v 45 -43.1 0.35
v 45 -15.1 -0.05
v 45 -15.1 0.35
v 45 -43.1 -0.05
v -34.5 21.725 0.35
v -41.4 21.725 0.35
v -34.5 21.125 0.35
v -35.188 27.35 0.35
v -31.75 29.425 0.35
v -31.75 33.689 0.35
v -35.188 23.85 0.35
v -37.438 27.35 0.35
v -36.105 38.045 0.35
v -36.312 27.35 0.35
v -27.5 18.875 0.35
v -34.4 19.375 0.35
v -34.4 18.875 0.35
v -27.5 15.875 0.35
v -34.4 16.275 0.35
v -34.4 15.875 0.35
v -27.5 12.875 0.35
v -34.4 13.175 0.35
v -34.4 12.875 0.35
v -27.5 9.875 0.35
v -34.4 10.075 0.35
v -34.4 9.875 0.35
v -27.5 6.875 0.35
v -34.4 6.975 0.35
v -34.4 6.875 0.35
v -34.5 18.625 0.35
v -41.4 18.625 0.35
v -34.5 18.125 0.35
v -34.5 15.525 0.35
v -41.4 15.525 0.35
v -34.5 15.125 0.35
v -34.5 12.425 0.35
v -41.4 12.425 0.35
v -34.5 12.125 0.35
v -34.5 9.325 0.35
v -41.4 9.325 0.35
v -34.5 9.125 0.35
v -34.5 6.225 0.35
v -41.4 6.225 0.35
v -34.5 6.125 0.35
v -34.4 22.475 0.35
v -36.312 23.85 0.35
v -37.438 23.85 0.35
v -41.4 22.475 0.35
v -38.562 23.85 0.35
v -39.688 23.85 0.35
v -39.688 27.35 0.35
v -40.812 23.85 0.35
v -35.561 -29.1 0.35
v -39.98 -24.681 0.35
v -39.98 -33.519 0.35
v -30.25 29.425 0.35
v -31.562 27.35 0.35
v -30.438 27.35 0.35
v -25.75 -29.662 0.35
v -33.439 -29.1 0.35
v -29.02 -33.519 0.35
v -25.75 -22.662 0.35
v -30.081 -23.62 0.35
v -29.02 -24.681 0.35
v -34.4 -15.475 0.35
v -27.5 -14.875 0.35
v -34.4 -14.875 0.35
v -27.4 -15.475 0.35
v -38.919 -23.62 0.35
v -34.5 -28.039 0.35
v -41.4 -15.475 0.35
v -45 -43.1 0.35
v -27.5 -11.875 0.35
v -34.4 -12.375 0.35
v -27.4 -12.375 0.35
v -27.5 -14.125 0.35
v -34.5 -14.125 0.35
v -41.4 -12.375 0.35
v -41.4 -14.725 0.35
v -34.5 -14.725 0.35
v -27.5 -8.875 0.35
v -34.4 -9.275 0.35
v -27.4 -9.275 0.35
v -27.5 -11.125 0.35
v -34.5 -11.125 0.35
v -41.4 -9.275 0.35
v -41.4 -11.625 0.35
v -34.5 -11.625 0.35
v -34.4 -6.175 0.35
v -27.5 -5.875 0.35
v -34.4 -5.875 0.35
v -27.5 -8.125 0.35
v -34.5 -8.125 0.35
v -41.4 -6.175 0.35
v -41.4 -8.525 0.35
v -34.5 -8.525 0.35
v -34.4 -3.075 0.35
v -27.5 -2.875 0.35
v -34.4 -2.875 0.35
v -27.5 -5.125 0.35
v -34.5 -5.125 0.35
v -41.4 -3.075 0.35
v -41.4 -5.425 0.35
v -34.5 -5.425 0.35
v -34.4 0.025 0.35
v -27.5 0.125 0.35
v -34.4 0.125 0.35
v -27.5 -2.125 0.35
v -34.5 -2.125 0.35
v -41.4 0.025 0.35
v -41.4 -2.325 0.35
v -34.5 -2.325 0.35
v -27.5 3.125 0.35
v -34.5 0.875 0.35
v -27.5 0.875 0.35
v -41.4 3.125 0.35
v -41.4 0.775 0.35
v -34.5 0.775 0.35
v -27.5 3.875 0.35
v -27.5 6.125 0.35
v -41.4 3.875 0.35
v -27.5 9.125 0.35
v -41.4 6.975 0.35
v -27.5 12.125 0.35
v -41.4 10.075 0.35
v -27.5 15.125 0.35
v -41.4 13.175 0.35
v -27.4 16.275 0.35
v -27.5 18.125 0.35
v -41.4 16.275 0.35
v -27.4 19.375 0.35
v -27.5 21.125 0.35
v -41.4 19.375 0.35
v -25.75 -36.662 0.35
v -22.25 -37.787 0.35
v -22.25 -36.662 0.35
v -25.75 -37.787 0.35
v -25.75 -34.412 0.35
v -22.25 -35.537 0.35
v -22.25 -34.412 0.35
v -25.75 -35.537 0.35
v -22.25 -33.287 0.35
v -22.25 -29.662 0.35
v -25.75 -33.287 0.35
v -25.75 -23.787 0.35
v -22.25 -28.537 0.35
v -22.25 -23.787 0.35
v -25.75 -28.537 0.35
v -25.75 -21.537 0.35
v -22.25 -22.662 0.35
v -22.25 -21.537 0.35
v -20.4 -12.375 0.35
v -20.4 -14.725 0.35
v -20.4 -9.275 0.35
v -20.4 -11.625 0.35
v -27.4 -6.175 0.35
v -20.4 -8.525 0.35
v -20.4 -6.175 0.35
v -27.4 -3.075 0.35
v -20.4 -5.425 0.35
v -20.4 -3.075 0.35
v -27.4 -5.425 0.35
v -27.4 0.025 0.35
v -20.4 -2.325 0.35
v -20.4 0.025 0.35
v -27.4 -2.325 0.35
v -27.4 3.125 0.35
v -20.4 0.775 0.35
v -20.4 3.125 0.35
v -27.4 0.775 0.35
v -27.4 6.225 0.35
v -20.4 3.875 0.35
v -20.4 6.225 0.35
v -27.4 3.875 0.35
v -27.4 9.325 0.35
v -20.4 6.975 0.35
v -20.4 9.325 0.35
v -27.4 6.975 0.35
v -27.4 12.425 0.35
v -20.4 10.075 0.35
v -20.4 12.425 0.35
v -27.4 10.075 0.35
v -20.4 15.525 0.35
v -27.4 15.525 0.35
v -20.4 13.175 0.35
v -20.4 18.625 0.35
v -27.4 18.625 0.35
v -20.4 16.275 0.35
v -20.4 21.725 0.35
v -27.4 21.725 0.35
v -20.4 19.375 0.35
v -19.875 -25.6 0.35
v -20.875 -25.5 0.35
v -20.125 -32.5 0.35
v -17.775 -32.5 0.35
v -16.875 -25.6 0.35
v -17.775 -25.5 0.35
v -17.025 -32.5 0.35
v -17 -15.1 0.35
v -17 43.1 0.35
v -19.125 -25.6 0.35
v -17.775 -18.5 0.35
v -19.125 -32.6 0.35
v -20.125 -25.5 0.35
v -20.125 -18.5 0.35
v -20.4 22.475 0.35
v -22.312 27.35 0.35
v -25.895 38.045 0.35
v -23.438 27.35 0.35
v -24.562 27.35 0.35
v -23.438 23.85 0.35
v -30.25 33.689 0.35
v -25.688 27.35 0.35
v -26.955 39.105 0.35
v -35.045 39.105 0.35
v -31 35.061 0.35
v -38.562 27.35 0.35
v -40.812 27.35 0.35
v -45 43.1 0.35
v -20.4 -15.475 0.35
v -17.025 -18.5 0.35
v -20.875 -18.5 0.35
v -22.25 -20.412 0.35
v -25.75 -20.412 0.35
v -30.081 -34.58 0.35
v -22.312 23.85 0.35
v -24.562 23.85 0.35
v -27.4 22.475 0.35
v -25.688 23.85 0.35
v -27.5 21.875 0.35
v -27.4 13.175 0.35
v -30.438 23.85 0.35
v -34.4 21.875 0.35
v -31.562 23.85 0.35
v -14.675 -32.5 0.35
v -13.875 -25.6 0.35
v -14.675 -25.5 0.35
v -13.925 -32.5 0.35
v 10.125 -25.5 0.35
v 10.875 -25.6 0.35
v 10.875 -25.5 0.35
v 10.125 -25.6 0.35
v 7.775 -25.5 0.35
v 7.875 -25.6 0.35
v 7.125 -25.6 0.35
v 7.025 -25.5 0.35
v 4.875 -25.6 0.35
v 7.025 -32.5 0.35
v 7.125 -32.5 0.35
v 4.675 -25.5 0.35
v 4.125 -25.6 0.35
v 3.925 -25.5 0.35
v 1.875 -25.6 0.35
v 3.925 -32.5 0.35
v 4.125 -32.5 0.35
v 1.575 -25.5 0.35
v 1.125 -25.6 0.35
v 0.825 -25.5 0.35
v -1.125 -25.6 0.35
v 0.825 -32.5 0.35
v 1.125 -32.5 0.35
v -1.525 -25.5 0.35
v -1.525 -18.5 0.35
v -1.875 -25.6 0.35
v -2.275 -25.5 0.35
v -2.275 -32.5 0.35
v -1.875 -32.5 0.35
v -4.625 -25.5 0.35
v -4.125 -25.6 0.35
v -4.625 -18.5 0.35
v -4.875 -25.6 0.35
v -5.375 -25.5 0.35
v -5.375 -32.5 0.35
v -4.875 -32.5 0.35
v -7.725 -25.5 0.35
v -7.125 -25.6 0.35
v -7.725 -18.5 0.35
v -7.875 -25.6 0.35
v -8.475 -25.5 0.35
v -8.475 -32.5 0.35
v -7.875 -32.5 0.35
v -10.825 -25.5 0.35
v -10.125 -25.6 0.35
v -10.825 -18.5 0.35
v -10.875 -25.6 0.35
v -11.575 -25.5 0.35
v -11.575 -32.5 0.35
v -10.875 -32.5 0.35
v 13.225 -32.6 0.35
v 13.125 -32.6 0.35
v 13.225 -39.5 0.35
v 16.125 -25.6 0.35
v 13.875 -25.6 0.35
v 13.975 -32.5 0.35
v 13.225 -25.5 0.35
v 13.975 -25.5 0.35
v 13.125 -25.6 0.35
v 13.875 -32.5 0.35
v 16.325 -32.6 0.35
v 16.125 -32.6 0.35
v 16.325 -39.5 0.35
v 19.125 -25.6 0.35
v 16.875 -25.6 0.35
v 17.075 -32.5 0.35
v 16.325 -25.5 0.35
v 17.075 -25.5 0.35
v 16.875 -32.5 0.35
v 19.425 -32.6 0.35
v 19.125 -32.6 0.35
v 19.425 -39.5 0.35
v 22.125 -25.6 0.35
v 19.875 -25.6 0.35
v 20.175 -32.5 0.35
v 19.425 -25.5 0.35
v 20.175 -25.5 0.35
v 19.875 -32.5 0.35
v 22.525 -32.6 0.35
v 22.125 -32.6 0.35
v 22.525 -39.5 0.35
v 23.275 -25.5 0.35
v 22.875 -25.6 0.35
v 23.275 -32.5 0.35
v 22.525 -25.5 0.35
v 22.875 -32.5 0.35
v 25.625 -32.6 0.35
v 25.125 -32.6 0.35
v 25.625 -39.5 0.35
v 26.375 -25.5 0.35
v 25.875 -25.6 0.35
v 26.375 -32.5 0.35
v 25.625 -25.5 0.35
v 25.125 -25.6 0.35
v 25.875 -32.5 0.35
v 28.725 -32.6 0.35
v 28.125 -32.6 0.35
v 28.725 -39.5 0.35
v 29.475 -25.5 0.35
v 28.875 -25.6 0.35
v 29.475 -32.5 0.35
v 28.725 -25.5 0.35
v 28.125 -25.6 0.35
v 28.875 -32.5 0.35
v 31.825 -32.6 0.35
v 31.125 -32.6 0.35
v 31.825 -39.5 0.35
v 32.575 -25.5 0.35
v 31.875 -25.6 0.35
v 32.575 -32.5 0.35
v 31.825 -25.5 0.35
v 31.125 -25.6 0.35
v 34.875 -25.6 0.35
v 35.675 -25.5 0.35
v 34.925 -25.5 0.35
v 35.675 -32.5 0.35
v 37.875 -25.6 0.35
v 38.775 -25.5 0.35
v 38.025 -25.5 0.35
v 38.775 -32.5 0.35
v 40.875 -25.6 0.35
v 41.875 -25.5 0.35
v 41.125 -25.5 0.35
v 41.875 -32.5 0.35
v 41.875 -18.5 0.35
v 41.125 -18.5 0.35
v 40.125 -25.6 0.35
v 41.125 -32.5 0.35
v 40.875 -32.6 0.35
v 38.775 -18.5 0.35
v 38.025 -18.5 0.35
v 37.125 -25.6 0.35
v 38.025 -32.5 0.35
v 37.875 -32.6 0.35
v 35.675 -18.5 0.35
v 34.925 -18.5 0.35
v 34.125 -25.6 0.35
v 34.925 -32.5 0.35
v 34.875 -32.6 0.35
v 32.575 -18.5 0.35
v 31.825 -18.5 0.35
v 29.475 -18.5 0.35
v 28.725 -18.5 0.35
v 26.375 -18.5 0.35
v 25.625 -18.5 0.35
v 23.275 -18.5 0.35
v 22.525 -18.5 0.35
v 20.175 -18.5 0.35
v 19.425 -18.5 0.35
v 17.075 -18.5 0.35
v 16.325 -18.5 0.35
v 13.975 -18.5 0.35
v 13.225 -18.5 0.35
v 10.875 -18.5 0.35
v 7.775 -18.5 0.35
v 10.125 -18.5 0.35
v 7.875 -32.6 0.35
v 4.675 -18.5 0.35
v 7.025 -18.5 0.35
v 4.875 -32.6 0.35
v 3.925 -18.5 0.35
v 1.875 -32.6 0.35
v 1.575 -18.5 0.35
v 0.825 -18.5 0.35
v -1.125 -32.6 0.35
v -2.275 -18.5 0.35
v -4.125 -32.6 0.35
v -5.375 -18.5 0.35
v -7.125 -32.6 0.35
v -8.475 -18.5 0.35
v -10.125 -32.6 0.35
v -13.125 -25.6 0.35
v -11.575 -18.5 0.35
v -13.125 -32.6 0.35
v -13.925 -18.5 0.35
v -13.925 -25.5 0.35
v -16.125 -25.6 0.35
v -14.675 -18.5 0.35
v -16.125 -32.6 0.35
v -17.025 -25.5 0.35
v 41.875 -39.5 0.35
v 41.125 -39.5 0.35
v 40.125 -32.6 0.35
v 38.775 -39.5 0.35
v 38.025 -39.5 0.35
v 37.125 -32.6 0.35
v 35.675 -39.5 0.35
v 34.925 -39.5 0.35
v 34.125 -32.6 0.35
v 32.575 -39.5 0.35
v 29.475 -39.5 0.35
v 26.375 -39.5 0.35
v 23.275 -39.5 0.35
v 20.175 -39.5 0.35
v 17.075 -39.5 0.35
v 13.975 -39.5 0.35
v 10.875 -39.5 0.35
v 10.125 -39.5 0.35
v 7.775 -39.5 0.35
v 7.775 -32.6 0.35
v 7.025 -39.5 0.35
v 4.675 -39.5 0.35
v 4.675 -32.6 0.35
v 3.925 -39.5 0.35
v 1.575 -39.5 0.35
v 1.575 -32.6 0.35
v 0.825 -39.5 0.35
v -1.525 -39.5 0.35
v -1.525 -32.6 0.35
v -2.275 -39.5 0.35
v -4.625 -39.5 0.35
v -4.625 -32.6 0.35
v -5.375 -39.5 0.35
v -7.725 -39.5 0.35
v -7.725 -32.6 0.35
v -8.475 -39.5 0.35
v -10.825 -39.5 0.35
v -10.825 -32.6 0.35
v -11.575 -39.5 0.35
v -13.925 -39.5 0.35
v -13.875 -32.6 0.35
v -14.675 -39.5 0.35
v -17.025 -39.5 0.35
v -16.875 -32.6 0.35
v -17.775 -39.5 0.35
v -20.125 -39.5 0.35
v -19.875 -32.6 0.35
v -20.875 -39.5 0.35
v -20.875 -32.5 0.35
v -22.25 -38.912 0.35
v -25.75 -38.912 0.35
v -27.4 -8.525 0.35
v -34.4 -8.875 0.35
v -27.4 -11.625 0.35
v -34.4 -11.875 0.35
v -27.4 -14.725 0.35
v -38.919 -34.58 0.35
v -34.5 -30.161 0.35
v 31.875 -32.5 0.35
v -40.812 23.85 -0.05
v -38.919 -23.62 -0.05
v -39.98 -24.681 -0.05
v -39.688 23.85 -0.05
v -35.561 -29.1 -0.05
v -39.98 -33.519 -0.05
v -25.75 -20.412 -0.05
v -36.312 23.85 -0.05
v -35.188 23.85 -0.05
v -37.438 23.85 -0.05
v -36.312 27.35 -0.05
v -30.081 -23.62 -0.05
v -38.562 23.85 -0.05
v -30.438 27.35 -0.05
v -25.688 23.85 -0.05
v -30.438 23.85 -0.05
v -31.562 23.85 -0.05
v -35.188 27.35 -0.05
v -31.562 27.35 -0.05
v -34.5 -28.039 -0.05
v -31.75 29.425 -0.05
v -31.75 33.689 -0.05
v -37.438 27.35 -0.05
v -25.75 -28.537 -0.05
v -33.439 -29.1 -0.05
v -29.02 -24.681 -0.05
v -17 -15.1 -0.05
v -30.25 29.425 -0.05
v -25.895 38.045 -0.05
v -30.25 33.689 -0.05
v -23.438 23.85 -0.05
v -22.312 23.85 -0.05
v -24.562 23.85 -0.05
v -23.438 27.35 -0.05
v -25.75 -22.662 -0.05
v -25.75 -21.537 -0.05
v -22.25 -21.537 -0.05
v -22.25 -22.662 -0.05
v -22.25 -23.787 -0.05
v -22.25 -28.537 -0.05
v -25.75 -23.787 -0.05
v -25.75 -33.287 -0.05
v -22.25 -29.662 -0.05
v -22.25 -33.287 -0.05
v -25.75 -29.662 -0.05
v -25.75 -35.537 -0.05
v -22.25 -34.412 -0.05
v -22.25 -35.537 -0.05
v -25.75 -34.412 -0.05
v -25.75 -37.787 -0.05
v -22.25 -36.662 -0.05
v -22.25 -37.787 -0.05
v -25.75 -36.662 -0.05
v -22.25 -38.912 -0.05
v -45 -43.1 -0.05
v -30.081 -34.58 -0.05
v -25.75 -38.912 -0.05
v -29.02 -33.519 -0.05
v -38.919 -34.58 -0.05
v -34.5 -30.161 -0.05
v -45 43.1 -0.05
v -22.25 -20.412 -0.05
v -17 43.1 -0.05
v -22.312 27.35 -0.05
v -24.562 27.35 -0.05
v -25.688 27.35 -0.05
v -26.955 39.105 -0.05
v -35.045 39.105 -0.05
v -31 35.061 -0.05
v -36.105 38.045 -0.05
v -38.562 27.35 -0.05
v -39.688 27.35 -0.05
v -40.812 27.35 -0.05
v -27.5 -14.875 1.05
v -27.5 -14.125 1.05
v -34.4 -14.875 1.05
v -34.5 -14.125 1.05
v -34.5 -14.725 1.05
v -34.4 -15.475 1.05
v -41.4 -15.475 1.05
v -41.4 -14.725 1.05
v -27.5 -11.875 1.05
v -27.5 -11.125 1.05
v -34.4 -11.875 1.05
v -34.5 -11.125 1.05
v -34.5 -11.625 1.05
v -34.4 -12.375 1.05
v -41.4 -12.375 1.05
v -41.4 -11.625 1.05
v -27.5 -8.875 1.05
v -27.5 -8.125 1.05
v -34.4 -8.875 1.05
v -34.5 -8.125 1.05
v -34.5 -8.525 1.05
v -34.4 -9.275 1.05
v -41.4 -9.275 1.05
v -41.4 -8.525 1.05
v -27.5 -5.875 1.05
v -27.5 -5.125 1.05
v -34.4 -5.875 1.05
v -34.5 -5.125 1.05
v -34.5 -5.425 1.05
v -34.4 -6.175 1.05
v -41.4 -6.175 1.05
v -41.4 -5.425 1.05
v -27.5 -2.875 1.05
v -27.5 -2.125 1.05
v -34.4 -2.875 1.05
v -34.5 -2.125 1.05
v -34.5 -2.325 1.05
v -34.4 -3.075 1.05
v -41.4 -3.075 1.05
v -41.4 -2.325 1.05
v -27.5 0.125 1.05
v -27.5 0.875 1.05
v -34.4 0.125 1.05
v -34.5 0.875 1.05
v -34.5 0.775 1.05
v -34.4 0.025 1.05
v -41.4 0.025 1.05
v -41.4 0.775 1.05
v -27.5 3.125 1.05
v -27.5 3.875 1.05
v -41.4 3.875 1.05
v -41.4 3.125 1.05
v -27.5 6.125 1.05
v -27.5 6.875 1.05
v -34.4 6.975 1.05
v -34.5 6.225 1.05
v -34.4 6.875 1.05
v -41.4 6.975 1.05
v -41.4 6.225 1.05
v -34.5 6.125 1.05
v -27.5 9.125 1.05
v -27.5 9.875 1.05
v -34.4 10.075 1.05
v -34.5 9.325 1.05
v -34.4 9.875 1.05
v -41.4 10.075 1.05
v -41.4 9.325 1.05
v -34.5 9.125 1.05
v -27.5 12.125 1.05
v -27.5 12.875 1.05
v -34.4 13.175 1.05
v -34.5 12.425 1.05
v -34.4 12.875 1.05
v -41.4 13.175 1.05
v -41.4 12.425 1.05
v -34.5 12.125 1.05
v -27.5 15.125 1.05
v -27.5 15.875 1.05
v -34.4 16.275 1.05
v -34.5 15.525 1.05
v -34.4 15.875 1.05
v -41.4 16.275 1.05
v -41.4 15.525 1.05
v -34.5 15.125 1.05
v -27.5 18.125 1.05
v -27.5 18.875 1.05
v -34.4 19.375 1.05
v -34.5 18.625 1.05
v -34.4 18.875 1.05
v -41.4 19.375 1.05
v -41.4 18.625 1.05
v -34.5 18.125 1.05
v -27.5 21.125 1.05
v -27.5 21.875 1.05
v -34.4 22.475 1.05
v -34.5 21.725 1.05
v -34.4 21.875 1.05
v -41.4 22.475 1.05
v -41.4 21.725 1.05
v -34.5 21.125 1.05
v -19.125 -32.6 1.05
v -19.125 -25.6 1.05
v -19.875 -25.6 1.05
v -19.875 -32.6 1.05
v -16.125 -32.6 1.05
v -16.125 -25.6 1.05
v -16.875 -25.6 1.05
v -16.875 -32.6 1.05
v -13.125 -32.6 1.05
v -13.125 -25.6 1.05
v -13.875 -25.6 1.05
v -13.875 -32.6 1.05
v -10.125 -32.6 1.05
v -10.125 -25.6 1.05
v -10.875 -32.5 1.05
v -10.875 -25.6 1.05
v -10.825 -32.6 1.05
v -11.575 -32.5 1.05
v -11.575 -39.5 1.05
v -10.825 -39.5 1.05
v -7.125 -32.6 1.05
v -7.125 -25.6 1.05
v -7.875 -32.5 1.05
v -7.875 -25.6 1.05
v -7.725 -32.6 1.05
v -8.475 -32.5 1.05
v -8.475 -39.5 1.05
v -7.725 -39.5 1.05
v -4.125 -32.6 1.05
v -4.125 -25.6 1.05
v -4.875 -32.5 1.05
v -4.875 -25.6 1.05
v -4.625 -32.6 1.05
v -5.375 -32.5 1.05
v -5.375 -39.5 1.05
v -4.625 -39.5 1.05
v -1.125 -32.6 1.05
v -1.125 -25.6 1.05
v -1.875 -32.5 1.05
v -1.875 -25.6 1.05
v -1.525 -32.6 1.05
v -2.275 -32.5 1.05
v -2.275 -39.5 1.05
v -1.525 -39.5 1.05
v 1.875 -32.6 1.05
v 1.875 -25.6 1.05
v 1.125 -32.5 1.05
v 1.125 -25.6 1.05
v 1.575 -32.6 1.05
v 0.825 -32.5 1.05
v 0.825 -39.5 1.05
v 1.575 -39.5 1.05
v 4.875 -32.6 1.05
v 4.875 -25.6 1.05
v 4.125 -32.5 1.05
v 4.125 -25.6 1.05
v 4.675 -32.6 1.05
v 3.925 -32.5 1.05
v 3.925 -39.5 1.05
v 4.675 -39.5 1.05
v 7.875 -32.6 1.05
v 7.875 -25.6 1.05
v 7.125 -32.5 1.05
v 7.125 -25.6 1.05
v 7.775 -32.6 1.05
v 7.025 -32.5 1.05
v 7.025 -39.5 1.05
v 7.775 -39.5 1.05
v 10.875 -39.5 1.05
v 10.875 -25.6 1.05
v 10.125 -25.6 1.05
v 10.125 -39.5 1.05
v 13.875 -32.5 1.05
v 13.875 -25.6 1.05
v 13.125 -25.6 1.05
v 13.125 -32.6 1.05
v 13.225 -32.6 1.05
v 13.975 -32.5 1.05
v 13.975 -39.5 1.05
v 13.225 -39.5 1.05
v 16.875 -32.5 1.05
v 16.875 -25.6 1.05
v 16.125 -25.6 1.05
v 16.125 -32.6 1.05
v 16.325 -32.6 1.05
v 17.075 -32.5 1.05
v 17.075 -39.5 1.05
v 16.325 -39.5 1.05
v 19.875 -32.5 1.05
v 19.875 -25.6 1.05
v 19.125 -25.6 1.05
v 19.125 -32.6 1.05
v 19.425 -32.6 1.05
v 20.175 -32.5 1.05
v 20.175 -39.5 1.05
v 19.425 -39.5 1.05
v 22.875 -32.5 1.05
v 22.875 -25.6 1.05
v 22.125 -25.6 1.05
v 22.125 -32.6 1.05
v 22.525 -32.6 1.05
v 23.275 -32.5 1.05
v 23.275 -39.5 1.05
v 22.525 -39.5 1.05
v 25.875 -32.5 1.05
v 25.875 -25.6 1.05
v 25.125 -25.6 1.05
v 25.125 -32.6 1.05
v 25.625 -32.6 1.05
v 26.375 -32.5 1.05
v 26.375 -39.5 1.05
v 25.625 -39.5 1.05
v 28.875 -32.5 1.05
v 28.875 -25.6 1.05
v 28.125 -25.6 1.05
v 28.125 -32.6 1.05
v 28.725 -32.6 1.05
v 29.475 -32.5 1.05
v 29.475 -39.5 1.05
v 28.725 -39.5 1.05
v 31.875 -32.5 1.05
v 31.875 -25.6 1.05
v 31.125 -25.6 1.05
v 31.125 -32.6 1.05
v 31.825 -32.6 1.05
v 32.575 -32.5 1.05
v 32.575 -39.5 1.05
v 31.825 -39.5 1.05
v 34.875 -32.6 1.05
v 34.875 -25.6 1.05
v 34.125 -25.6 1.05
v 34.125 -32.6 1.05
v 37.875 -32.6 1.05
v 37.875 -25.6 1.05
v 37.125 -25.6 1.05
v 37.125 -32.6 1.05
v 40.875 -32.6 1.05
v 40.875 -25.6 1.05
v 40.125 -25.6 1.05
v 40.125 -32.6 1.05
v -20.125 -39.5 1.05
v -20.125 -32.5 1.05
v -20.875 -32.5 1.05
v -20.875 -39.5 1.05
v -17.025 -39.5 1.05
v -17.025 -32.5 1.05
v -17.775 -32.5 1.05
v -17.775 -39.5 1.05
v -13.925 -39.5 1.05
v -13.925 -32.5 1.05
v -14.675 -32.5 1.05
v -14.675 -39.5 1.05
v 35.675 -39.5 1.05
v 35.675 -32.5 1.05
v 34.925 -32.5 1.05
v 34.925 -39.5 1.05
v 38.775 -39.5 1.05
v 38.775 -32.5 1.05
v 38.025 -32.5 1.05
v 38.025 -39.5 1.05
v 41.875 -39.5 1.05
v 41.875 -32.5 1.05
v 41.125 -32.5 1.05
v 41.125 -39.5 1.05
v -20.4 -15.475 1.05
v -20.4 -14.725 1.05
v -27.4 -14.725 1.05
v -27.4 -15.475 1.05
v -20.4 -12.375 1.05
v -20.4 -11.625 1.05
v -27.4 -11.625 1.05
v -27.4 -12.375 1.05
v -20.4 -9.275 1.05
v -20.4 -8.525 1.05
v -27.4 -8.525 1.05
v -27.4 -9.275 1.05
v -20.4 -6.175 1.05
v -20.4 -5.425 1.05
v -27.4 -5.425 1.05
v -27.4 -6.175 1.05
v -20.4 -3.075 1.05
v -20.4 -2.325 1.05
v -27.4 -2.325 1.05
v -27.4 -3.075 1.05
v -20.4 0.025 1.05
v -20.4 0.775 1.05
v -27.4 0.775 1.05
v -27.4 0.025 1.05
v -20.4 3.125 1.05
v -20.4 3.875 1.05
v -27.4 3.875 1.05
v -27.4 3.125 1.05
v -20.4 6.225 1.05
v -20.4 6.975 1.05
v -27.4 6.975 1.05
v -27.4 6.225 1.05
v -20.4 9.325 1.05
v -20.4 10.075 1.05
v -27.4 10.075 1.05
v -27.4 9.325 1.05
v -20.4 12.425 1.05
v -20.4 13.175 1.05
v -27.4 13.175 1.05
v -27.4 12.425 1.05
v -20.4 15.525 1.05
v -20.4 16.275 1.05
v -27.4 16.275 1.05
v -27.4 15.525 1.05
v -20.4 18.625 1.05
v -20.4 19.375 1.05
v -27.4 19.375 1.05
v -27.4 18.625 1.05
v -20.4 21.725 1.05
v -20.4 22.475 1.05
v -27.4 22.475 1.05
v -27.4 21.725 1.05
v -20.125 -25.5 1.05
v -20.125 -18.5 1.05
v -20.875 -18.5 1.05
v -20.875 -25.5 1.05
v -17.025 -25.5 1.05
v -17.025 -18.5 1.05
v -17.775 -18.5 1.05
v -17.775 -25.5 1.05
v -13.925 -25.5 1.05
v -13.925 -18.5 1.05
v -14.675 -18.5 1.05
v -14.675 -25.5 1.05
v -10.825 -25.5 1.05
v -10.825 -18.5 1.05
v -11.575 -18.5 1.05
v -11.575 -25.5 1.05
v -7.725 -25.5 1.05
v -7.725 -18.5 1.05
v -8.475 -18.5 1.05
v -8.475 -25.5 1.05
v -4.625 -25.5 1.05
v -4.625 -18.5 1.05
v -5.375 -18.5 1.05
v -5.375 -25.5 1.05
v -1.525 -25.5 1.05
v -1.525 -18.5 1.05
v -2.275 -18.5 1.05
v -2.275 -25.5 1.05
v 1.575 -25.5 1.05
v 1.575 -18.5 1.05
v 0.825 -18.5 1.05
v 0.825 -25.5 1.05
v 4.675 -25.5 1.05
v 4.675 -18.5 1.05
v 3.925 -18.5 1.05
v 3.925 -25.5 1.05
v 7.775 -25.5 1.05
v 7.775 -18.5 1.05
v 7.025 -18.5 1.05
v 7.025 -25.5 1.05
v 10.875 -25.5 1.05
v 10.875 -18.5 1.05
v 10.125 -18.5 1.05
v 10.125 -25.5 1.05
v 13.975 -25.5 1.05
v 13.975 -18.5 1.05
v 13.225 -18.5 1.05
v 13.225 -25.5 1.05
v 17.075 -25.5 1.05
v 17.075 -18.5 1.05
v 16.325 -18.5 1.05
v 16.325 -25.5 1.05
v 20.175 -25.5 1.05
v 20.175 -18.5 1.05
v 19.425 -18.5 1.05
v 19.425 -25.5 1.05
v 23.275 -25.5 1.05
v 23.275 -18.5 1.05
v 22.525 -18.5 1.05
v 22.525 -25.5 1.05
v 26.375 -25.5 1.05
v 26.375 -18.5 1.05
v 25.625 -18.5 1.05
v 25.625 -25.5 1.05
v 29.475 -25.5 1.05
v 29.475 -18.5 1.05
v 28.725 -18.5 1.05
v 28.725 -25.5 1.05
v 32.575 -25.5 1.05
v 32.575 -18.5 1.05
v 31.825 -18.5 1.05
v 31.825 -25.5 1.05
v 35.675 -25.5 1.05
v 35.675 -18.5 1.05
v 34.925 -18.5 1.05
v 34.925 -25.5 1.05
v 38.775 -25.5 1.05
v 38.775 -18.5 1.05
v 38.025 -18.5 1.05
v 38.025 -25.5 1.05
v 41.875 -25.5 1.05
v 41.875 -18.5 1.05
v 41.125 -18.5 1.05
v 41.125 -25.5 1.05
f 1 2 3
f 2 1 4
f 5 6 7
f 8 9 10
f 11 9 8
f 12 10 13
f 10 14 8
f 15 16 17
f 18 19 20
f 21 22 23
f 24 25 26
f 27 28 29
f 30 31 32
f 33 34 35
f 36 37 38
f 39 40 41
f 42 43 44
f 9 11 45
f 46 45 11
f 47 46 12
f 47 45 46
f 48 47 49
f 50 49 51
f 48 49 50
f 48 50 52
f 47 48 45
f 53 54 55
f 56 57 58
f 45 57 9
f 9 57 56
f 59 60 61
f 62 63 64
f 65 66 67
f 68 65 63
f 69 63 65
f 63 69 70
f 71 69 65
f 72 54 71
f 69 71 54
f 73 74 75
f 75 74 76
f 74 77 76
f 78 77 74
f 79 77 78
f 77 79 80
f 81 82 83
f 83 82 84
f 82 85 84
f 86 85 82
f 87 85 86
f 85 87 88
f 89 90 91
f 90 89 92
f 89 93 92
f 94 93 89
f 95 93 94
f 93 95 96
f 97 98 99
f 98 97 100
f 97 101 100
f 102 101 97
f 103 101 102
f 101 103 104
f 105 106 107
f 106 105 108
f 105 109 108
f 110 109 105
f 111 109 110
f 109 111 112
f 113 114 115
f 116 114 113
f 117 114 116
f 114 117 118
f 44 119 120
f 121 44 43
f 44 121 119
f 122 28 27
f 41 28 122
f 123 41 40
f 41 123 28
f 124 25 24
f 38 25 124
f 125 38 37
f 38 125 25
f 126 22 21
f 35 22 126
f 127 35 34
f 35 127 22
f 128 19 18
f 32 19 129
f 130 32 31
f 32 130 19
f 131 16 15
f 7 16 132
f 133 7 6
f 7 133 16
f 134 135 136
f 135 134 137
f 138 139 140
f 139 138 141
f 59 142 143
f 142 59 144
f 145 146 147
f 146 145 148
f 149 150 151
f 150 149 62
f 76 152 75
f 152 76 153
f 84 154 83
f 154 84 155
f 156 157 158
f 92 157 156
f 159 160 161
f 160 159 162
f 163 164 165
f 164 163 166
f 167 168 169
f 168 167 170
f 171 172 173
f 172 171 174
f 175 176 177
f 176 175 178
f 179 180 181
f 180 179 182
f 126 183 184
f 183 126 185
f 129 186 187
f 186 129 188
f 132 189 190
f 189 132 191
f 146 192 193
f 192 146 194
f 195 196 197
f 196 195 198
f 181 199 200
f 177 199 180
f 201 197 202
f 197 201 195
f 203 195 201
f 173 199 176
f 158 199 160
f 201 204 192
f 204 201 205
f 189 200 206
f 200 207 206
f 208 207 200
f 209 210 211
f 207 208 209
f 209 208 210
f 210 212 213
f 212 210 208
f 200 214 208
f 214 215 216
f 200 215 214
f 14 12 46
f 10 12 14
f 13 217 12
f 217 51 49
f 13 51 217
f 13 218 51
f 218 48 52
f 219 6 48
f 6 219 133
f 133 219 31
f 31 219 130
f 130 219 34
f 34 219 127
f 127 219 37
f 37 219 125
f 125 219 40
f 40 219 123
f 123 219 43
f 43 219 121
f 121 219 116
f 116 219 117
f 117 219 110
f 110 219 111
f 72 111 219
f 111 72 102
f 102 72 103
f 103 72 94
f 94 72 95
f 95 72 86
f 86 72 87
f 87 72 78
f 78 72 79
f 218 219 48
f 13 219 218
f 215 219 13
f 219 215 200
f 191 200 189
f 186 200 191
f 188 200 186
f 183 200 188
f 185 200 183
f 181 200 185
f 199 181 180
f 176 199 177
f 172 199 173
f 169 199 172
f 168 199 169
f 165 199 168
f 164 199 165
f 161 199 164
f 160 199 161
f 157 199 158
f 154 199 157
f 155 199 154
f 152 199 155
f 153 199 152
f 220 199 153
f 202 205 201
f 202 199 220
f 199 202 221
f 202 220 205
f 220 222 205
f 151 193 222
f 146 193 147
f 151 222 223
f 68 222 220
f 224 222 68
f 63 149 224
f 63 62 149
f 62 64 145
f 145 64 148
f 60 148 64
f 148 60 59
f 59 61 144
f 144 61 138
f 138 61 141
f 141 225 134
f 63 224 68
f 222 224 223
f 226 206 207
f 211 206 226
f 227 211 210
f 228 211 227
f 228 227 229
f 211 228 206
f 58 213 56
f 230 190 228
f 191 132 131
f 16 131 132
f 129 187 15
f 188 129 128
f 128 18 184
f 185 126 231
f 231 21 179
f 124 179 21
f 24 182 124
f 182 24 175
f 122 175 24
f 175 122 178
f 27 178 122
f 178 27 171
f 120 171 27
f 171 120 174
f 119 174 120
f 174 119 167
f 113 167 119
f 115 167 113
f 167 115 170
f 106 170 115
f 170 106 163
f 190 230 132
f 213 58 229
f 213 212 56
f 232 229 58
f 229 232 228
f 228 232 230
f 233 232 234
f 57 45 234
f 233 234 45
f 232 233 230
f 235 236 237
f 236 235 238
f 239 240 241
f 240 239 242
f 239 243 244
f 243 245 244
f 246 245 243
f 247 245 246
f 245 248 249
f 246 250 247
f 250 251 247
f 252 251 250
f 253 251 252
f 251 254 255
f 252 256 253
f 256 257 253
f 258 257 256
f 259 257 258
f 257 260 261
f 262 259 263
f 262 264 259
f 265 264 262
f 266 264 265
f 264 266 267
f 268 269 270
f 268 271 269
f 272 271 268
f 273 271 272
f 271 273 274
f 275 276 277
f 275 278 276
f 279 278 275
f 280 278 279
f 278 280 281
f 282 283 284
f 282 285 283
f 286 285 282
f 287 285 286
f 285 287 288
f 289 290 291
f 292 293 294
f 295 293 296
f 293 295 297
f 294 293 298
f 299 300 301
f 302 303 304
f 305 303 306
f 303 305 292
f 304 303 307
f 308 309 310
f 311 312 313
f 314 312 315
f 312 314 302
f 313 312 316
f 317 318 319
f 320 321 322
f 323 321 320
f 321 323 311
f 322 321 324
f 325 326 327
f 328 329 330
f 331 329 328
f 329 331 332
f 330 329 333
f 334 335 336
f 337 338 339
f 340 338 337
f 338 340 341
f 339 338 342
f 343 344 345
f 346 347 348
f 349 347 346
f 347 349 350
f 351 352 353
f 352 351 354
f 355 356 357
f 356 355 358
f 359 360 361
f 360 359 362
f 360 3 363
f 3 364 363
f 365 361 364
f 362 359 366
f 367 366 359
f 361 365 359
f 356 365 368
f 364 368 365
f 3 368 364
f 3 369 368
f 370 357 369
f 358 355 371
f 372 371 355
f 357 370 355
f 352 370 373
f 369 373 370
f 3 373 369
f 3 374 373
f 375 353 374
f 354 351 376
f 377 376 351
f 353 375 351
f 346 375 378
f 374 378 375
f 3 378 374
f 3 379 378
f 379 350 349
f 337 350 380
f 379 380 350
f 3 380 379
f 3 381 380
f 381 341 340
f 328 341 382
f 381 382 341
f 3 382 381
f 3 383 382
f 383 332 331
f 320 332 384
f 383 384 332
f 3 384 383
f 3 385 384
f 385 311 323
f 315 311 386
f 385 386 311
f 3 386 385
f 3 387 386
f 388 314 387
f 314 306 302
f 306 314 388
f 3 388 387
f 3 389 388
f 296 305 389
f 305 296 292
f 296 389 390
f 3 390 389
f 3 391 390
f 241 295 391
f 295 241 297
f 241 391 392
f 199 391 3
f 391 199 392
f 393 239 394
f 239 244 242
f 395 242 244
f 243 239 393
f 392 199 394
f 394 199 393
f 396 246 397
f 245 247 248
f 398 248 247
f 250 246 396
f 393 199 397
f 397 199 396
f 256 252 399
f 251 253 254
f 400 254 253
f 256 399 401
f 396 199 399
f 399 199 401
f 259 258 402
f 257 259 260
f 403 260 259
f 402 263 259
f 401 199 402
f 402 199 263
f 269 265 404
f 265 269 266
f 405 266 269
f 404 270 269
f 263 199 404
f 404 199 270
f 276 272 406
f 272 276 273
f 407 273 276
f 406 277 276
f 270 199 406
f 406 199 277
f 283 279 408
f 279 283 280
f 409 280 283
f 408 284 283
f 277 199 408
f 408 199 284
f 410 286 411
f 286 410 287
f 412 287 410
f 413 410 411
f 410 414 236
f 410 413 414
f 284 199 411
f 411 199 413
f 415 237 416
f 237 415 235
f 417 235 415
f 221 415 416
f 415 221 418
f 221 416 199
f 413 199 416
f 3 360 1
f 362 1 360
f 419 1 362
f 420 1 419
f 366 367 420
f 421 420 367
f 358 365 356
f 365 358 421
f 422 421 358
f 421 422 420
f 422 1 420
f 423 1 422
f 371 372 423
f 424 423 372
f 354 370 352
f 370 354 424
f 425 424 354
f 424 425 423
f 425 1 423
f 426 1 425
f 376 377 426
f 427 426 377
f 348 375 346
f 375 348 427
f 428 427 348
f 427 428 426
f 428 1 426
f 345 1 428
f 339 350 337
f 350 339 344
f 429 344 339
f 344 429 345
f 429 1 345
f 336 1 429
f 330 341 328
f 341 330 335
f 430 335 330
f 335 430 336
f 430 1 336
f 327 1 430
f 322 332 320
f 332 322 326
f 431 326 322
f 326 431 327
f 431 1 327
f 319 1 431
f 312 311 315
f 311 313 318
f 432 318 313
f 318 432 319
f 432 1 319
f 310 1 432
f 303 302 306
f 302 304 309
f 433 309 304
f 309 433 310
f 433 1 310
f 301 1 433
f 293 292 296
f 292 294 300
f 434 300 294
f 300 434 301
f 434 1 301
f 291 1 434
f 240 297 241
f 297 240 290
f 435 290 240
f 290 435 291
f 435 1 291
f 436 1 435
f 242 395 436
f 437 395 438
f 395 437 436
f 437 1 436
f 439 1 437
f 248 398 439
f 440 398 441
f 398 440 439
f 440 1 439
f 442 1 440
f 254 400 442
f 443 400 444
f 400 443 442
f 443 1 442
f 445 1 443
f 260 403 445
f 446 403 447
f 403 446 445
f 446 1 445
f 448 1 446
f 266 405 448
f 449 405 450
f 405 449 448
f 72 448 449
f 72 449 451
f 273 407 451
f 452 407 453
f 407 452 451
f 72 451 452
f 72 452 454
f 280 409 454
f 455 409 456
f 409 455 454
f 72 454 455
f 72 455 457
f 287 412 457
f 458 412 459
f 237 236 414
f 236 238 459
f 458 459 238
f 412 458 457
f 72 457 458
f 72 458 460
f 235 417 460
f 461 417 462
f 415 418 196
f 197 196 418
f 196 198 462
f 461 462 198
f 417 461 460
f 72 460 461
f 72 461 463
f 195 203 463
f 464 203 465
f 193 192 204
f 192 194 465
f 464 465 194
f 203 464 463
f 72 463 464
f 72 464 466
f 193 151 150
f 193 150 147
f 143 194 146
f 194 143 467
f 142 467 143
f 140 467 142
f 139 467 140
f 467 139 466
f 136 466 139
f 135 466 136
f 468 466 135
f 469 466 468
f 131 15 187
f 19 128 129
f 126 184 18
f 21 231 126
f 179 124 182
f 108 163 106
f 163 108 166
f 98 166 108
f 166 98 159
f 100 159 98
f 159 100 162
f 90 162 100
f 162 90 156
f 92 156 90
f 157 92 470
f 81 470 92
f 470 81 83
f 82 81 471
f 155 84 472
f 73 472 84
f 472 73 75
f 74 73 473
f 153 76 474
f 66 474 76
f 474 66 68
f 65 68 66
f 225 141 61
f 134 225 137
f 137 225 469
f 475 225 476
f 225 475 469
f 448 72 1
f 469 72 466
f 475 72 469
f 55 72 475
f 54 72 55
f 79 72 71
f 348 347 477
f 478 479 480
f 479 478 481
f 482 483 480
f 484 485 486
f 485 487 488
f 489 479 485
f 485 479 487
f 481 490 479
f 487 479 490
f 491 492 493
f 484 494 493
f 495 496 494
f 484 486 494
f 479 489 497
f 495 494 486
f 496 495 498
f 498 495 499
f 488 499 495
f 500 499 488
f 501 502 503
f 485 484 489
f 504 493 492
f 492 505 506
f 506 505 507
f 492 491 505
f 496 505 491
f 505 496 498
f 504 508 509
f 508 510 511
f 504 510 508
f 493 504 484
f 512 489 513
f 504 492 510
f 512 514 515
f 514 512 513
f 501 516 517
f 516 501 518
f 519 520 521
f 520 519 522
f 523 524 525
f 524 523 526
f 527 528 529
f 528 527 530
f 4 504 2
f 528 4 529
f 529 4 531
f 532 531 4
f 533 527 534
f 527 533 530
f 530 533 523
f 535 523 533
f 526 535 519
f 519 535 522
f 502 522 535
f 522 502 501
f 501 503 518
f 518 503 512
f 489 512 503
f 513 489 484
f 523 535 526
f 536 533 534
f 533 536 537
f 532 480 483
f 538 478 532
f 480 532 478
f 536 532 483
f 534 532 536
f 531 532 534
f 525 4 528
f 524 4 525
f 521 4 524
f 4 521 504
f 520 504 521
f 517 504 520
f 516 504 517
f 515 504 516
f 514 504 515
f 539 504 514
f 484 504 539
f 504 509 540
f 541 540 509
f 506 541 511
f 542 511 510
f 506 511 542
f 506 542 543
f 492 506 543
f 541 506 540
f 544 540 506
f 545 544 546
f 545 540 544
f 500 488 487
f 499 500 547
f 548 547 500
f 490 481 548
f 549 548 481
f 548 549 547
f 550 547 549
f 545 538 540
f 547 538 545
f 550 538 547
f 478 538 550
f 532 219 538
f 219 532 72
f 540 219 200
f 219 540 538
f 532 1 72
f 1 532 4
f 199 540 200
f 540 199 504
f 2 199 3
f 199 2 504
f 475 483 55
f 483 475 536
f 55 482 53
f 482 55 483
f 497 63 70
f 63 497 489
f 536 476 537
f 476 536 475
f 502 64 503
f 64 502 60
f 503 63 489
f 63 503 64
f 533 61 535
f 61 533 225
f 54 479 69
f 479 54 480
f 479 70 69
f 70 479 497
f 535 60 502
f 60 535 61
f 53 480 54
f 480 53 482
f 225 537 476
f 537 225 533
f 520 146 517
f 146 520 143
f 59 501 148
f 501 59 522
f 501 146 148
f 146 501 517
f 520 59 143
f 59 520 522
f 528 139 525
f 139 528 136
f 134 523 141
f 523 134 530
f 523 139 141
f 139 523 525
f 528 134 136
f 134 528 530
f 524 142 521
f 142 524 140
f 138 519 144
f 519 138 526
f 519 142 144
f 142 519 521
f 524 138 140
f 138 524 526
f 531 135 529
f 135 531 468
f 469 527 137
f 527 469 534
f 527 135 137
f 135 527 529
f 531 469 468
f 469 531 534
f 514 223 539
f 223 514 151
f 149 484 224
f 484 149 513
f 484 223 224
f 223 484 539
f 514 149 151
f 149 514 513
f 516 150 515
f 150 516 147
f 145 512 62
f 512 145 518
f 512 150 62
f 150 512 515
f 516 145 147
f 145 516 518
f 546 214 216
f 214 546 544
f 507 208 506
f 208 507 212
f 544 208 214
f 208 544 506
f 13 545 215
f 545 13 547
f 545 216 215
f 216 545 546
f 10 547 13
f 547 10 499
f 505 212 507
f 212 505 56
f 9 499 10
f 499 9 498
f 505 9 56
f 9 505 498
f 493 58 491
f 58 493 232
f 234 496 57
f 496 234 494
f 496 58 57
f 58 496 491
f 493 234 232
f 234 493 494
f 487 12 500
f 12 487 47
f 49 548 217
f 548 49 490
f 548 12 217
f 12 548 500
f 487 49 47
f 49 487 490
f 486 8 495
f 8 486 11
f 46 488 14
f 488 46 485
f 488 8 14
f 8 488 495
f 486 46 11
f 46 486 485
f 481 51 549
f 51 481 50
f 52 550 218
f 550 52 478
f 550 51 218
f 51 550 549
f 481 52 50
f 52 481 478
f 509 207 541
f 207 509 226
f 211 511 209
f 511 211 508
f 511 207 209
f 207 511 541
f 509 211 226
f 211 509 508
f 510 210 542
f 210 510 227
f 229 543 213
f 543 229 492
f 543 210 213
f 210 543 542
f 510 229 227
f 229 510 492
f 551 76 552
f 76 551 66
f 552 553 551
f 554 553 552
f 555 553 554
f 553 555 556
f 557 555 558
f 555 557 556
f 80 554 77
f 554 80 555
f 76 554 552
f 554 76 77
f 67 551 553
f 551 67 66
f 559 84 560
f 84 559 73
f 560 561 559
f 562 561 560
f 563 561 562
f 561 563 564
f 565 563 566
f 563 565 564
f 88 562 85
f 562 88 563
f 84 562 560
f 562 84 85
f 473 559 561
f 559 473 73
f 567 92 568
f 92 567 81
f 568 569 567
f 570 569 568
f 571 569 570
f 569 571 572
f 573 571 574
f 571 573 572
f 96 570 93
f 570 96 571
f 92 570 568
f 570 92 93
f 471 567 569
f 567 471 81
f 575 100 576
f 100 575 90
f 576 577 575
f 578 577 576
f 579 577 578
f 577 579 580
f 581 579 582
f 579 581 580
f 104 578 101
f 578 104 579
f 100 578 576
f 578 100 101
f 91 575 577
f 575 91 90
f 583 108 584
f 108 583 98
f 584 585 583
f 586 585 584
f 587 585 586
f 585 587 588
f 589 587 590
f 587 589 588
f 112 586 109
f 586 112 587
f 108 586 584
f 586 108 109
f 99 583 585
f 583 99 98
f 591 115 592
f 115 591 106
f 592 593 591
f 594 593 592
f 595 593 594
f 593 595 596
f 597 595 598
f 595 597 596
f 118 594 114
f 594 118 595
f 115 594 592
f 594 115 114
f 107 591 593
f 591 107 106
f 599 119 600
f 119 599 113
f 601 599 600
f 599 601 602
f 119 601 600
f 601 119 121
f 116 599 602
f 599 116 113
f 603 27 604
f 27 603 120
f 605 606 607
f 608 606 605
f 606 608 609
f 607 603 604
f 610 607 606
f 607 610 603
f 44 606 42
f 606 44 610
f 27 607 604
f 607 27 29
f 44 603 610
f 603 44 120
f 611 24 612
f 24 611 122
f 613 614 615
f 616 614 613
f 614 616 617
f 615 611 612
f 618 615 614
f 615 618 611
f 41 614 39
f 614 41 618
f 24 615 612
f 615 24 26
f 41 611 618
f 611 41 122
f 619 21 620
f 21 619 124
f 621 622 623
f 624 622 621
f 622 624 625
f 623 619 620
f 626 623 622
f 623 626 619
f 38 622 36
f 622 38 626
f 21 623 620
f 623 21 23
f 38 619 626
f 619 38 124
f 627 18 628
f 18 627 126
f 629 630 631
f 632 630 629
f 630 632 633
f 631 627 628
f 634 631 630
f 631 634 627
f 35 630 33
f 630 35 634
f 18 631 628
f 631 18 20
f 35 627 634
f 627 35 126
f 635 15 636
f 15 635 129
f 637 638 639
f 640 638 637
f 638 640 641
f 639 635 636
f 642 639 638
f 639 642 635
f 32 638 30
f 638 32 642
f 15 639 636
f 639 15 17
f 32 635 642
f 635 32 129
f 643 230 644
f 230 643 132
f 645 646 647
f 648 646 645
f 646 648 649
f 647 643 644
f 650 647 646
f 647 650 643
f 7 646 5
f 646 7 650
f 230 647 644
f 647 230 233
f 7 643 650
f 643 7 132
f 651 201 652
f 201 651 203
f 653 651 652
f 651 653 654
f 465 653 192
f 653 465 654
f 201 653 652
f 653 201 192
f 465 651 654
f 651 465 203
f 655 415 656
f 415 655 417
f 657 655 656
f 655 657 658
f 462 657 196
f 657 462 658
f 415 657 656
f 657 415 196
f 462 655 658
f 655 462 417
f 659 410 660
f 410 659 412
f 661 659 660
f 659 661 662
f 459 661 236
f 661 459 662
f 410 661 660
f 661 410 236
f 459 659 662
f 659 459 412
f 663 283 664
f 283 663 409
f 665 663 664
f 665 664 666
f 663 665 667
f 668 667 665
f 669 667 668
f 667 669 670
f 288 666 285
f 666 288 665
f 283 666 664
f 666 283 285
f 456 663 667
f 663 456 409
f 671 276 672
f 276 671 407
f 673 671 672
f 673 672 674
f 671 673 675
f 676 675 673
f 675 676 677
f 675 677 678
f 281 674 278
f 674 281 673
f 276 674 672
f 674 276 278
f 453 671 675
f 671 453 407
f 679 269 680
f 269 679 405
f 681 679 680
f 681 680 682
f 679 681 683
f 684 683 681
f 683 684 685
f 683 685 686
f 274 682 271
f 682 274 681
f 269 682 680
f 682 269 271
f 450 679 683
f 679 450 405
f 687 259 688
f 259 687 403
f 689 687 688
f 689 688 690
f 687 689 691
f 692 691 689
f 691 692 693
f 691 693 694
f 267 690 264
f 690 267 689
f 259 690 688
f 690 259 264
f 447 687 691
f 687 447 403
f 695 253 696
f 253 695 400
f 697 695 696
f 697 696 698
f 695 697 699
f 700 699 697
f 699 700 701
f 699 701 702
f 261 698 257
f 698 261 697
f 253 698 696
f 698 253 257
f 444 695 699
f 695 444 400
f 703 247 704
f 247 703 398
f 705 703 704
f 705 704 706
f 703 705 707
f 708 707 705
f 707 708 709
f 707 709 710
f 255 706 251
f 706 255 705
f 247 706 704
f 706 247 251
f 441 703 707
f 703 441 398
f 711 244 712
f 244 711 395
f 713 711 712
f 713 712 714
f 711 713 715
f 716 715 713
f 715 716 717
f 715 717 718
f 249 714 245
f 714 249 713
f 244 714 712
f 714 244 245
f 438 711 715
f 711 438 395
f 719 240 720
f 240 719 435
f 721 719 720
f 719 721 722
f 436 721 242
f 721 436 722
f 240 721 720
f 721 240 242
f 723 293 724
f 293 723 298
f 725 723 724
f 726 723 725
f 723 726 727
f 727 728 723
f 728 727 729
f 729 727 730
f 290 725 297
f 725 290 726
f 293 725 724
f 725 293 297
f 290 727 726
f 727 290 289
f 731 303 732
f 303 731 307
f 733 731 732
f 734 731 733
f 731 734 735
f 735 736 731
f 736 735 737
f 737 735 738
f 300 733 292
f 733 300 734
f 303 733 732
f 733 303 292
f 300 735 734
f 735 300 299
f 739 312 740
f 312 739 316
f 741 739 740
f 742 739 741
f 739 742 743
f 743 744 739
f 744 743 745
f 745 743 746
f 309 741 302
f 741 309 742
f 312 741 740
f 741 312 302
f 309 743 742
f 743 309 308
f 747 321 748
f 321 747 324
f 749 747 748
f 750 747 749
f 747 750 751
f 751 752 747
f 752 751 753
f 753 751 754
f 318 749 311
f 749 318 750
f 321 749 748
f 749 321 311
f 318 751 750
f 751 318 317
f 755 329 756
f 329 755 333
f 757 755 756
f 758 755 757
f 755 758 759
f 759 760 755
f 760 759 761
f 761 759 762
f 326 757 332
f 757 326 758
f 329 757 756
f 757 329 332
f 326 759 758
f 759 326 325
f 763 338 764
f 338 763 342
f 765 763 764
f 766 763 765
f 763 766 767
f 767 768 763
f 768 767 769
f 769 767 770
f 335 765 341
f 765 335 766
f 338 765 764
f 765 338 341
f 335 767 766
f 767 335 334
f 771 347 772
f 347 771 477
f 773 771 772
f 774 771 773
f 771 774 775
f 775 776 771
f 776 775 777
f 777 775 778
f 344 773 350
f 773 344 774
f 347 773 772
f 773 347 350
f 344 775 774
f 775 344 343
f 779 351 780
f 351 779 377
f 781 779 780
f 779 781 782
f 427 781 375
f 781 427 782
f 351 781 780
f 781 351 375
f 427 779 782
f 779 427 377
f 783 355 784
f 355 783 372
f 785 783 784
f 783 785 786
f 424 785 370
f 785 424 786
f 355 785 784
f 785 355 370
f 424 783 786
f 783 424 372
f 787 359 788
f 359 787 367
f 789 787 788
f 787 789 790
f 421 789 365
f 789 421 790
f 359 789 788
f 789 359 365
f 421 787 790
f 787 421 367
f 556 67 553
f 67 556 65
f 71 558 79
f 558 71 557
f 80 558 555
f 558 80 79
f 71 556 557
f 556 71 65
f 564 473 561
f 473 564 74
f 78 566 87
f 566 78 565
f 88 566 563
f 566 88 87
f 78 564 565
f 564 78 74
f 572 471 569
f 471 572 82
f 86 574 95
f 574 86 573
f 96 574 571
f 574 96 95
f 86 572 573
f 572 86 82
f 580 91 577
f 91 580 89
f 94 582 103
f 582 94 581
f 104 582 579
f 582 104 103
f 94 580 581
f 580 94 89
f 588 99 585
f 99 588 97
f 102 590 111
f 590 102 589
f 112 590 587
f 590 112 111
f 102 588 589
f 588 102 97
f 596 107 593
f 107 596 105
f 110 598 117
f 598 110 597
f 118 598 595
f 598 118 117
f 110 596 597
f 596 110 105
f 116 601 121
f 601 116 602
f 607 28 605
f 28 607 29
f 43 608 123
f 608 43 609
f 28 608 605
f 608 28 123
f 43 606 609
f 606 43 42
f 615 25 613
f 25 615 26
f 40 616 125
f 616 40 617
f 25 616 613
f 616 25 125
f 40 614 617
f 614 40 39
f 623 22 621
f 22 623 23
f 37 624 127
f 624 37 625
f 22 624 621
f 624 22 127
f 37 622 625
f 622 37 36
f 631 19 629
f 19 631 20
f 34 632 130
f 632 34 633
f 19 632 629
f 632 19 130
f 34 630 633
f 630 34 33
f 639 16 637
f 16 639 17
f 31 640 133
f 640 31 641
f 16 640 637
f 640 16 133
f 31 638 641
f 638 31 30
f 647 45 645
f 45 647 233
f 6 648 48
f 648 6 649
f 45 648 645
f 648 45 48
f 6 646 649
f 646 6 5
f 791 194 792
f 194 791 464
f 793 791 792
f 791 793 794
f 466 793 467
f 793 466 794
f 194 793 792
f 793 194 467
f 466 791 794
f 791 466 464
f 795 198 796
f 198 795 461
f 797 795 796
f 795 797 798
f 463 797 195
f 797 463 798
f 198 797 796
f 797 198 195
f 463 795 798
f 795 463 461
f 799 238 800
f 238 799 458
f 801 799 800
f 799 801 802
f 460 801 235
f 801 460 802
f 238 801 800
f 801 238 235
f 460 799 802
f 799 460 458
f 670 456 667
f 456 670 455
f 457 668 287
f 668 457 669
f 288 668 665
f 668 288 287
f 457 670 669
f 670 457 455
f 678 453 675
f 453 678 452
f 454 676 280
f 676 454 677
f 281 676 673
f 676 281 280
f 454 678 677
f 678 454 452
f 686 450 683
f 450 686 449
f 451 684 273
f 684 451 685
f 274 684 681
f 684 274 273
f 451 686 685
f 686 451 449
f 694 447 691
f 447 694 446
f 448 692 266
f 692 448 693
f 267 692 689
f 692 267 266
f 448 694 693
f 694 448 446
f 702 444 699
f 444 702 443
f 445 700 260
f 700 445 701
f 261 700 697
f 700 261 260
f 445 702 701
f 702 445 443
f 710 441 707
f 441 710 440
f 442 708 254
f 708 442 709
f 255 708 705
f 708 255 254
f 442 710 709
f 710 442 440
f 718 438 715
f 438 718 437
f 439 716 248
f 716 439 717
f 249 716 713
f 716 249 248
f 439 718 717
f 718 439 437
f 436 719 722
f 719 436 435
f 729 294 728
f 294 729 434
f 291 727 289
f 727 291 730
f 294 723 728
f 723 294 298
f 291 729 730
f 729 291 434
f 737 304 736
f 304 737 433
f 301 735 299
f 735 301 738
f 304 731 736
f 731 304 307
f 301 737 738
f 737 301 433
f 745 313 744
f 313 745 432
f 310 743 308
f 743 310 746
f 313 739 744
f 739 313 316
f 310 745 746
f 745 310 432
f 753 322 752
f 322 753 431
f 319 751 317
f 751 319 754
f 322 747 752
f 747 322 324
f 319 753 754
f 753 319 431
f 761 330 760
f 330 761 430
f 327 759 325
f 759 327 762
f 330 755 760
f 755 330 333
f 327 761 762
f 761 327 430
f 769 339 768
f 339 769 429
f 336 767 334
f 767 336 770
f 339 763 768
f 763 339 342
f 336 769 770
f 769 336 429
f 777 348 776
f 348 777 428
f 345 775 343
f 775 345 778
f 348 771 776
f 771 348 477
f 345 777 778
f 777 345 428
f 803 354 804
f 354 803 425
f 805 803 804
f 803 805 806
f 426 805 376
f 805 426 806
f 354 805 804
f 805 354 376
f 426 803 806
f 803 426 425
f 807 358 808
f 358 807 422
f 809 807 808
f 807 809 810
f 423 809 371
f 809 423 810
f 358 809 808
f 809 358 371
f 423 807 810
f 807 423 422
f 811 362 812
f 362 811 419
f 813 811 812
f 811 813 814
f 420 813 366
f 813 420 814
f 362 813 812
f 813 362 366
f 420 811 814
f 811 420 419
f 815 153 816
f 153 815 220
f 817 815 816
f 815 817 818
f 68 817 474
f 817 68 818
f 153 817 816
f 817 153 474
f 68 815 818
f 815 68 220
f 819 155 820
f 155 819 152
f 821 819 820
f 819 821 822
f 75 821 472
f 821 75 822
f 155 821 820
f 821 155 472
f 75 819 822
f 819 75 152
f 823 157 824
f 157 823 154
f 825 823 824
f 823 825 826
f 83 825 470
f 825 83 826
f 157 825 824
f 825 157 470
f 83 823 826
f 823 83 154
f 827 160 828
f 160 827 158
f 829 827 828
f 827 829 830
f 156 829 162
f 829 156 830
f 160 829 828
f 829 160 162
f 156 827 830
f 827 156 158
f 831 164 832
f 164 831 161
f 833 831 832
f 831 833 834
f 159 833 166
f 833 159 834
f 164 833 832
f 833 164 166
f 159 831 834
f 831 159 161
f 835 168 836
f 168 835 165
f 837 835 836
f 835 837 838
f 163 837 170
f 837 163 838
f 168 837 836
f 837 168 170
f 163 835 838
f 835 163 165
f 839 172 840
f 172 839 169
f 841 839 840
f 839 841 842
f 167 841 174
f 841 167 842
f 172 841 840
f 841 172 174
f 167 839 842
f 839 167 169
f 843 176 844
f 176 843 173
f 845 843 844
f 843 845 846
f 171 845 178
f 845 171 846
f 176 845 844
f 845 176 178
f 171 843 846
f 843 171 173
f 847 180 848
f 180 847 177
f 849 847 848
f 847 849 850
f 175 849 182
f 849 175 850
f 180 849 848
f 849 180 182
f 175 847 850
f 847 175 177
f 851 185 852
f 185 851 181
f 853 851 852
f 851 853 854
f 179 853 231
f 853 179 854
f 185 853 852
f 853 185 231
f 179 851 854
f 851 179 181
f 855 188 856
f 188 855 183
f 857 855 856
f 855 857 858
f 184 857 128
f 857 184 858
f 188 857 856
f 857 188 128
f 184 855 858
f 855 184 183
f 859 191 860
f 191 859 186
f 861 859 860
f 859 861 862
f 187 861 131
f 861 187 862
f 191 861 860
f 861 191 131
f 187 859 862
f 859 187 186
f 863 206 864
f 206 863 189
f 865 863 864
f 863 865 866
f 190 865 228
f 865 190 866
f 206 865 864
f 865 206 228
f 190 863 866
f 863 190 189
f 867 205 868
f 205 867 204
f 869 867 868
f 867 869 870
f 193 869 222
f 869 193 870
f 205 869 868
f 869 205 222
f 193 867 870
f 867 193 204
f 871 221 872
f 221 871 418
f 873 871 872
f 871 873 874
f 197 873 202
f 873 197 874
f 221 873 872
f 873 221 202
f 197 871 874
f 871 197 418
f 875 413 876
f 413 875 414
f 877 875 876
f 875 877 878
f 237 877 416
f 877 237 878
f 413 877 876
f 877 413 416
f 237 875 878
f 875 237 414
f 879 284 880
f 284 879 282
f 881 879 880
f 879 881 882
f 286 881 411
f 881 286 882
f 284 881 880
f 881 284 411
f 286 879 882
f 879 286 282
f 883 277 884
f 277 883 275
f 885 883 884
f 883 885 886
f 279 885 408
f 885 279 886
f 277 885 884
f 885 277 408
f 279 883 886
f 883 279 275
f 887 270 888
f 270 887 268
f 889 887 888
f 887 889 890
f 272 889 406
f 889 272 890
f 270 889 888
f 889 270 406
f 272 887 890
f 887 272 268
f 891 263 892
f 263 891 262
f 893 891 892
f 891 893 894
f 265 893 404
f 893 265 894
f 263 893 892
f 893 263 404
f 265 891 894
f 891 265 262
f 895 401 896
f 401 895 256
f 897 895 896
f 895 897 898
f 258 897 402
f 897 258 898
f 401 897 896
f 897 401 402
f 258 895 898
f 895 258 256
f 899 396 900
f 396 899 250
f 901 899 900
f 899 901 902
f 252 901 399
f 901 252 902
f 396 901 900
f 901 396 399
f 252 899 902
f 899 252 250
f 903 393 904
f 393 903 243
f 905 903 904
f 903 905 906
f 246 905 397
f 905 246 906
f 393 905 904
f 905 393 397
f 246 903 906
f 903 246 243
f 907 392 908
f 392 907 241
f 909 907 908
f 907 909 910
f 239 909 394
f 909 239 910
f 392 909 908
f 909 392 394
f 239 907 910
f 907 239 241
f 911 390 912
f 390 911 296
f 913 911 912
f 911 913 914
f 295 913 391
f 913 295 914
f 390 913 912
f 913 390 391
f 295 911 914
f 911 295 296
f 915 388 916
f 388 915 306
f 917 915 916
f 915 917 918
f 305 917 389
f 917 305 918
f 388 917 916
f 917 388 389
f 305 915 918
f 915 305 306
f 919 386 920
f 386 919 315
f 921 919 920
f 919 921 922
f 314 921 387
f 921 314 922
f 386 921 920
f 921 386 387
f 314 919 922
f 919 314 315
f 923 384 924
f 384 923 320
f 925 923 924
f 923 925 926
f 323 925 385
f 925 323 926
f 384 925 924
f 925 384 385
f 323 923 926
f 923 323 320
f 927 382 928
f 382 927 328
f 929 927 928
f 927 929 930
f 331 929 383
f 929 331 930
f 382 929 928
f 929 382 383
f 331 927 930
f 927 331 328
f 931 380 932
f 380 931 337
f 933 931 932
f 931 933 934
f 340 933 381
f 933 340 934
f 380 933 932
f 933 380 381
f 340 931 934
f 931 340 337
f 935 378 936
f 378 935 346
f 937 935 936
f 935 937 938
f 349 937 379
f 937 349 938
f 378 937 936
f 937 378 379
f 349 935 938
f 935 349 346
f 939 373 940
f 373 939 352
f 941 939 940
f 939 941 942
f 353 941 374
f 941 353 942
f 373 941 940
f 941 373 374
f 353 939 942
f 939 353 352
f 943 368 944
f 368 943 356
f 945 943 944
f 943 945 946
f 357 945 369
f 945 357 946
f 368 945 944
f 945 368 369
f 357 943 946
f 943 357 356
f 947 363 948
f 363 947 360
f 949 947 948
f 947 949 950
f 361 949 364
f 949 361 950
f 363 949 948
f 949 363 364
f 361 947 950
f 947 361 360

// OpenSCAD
spacing=3;
increment=0.1;
length=7;

x_lines=10;
y_lines=6;

line_w=0.75;
base_t=0.3;
line_t=0.75;

plate_x=2*x_lines*(spacing+increment)+4*length;
plate_y=2*y_lines*(spacing+increment)+7*length;

module  y_arrow()   {
    polyhedron  (
        points  =   [
            [2*line_w+length/2,0,line_t/2],     //0
            [2*line_w+length/2,0,-line_t/2],    //1

            [length/6,spacing/3,line_t/2],      //2
            [length/6,spacing/3,-line_t/2],     //3

            [length/6,-spacing/3,line_t/2],     //4
            [length/6,-spacing/3,-line_t/2]     //5
        ],
        triangles   =   [
            [0,2,4],    [4,1,0],    [0,2,1],    [1,4,5],
            [5,4,2],    [2,3,5],    [5,3,1],    [1,3,2]
        ]
    );
};

module  x_arrow()   {
    polyhedron  (
        points  =   [
            [0,2*line_w+length/2,line_t/2], //0
            [0,2*line_w+length/2,-line_t/2],    //1

            [spacing/3,length/6,line_t/2],  //2
            [spacing/3,length/6,-line_t/2], //3

            [-spacing/3,length/6,line_t/2], //4
            [-spacing/3,length/6,-line_t/2] //5
        ],
        triangles   =   [
            [0,2,4],    [4,1,0],    [0,2,1],    [1,4,5],
            [5,4,2],    [2,3,5],    [5,3,1],    [1,3,2]
        ]
    );
};


module  ref_lines_x()   {
    for (   x   =   [-x_lines   :   x_lines]    )
    {
        translate([x*spacing,   0,  0])
        cube([line_w,   length, line_t],    center=true);
    }

    x_arrow();
    mirror([0,1,0]) x_arrow();
};


module  ref_lines_y()   {
    for (   y   =   [-y_lines   :   y_lines]    )
    {
        translate([0,   y*spacing,  0])
        cube([length,line_w,line_t],    center=true);
    }

    y_arrow();
    mirror([1,0,0]) y_arrow();
};

module  comp_lines_x()  {
    for (   x   =   [-x_lines   :   x_lines]    )
    {
        translate([x*(spacing+increment),   0,  0])
        cube([line_w,length,line_t],    center=true);
    }
};

module  comp_lines_y()  {
    for (   y   =   [-y_lines   :   y_lines]    )
    {
        translate([0,   y*(spacing+increment),  0])
        cube([length,line_w,line_t],    center=true);
    }
};

module  extruder_1()    {
    translate([0,0,base_t/2])
        difference() {
            cube([plate_x,plate_y,base_t+0.1],  center=true);
            translate([4*length,4*length,0])
                cube([plate_x,plate_y,2*base_t],    center=true);


            translate([1.5*length-plate_x/2,2*length-plate_y/2,0])
                rotate([0,0,45])
                    cube([length*2, 2*line_w, 2*base_t], center=true);
            translate([1.5*length-plate_x/2,2*length-plate_y/2,0])
                rotate([0,0,-45])
                    cube([length*2, 2*line_w, 2*base_t], center=true);

            translate([3*length-plate_x/2,2*length-plate_y/2,0])
                cube([length/2, line_w*1.5, 2*base_t], center=true);

            translate([3*length-plate_x/2,length-plate_y/2,0])
                cube([length/2, line_w*1.5, 2*base_t], center=true);
            translate([3*length-plate_x/2,3*line_w+length-plate_y/2,0])
                cube([length/2, line_w*1.5, 2*base_t], center=true);
            translate([3*length-plate_x/2,length-plate_y/2-3*line_w,0])
                cube([length/2, line_w*1.5, 2*base_t], center=true);

            translate([3*length-plate_x/2,1.5*line_w+3*length-plate_y/2,0])
                cube([length/2, line_w*1.5, 2*base_t], center=true);
            translate([3*length-plate_x/2,3*length-plate_y/2-1.5*line_w,0])
                cube([length/2, line_w*1.5, 2*base_t], center=true);

            translate([2.3*length-plate_x/2,plate_y/2-length,0])
                rotate([0,0,45])
                    cube([1*length, 2*line_w, 2*base_t], center=true);
            translate([1.7*length-plate_x/2,plate_y/2-length,0])
                rotate([0,0,-45])
                    cube([1*length, 2*line_w, 2*base_t], center=true);
            translate([2*length-plate_x/2,plate_y/2-1.6*length,0])
                    cube([2*line_w, 0.707*length, 2*base_t], center=true);


            translate([2*length-plate_x/2,plate_y/2-2.5*length,0])
                cube([line_w*1.5, length/2, 2*base_t], center=true);

            translate([length-plate_x/2,plate_y/2-2.5*length,0])
                cube([line_w*1.5, length/2, 2*base_t], center=true);
            translate([3*line_w+length-plate_x/2,plate_y/2-2.5*length,0])
                cube([line_w*1.5, length/2, 2*base_t], center=true);
            translate([length-plate_x/2-3*line_w,plate_y/2-2.5*length,0])
                cube([line_w*1.5, length/2, 2*base_t], center=true);

            translate([1.5*line_w+3*length-plate_x/2,plate_y/2-2.5*length,0])
                cube([line_w*1.5, length/2, 2*base_t], center=true);
            translate([3*length-plate_x/2-1.5*line_w,plate_y/2-2.5*length,0])
                cube([line_w*1.5, length/2, 2*base_t], center=true);



        }
    color([1,0,0])  {
        translate([2*length-plate_x/2,length/2,line_t/2+base_t])
            ref_lines_y();
        translate([1.5*length,2*length-plate_y/2,line_t/2+base_t])
            ref_lines_x();      
    }
}

module  extruder_2()    {
    color([0,1,0])  {
        translate([length+0.1-plate_x/2,length/2,line_t/2+base_t])
            comp_lines_y();
        translate([1.5*length,length+0.1-plate_y/2,line_t/2+base_t])
            comp_lines_x();
    }
}

module  extruder_3()    {
    color([0,0,1])  {
        translate([3*length+0.1-plate_x/2,length/2,line_t/2+base_t])
            comp_lines_y();
        translate([1.5*length,3*length+0.1-plate_y/2,line_t/2+base_t])
            comp_lines_x();
    }
}

extruder_1();
extruder_2();
extruder_3();
